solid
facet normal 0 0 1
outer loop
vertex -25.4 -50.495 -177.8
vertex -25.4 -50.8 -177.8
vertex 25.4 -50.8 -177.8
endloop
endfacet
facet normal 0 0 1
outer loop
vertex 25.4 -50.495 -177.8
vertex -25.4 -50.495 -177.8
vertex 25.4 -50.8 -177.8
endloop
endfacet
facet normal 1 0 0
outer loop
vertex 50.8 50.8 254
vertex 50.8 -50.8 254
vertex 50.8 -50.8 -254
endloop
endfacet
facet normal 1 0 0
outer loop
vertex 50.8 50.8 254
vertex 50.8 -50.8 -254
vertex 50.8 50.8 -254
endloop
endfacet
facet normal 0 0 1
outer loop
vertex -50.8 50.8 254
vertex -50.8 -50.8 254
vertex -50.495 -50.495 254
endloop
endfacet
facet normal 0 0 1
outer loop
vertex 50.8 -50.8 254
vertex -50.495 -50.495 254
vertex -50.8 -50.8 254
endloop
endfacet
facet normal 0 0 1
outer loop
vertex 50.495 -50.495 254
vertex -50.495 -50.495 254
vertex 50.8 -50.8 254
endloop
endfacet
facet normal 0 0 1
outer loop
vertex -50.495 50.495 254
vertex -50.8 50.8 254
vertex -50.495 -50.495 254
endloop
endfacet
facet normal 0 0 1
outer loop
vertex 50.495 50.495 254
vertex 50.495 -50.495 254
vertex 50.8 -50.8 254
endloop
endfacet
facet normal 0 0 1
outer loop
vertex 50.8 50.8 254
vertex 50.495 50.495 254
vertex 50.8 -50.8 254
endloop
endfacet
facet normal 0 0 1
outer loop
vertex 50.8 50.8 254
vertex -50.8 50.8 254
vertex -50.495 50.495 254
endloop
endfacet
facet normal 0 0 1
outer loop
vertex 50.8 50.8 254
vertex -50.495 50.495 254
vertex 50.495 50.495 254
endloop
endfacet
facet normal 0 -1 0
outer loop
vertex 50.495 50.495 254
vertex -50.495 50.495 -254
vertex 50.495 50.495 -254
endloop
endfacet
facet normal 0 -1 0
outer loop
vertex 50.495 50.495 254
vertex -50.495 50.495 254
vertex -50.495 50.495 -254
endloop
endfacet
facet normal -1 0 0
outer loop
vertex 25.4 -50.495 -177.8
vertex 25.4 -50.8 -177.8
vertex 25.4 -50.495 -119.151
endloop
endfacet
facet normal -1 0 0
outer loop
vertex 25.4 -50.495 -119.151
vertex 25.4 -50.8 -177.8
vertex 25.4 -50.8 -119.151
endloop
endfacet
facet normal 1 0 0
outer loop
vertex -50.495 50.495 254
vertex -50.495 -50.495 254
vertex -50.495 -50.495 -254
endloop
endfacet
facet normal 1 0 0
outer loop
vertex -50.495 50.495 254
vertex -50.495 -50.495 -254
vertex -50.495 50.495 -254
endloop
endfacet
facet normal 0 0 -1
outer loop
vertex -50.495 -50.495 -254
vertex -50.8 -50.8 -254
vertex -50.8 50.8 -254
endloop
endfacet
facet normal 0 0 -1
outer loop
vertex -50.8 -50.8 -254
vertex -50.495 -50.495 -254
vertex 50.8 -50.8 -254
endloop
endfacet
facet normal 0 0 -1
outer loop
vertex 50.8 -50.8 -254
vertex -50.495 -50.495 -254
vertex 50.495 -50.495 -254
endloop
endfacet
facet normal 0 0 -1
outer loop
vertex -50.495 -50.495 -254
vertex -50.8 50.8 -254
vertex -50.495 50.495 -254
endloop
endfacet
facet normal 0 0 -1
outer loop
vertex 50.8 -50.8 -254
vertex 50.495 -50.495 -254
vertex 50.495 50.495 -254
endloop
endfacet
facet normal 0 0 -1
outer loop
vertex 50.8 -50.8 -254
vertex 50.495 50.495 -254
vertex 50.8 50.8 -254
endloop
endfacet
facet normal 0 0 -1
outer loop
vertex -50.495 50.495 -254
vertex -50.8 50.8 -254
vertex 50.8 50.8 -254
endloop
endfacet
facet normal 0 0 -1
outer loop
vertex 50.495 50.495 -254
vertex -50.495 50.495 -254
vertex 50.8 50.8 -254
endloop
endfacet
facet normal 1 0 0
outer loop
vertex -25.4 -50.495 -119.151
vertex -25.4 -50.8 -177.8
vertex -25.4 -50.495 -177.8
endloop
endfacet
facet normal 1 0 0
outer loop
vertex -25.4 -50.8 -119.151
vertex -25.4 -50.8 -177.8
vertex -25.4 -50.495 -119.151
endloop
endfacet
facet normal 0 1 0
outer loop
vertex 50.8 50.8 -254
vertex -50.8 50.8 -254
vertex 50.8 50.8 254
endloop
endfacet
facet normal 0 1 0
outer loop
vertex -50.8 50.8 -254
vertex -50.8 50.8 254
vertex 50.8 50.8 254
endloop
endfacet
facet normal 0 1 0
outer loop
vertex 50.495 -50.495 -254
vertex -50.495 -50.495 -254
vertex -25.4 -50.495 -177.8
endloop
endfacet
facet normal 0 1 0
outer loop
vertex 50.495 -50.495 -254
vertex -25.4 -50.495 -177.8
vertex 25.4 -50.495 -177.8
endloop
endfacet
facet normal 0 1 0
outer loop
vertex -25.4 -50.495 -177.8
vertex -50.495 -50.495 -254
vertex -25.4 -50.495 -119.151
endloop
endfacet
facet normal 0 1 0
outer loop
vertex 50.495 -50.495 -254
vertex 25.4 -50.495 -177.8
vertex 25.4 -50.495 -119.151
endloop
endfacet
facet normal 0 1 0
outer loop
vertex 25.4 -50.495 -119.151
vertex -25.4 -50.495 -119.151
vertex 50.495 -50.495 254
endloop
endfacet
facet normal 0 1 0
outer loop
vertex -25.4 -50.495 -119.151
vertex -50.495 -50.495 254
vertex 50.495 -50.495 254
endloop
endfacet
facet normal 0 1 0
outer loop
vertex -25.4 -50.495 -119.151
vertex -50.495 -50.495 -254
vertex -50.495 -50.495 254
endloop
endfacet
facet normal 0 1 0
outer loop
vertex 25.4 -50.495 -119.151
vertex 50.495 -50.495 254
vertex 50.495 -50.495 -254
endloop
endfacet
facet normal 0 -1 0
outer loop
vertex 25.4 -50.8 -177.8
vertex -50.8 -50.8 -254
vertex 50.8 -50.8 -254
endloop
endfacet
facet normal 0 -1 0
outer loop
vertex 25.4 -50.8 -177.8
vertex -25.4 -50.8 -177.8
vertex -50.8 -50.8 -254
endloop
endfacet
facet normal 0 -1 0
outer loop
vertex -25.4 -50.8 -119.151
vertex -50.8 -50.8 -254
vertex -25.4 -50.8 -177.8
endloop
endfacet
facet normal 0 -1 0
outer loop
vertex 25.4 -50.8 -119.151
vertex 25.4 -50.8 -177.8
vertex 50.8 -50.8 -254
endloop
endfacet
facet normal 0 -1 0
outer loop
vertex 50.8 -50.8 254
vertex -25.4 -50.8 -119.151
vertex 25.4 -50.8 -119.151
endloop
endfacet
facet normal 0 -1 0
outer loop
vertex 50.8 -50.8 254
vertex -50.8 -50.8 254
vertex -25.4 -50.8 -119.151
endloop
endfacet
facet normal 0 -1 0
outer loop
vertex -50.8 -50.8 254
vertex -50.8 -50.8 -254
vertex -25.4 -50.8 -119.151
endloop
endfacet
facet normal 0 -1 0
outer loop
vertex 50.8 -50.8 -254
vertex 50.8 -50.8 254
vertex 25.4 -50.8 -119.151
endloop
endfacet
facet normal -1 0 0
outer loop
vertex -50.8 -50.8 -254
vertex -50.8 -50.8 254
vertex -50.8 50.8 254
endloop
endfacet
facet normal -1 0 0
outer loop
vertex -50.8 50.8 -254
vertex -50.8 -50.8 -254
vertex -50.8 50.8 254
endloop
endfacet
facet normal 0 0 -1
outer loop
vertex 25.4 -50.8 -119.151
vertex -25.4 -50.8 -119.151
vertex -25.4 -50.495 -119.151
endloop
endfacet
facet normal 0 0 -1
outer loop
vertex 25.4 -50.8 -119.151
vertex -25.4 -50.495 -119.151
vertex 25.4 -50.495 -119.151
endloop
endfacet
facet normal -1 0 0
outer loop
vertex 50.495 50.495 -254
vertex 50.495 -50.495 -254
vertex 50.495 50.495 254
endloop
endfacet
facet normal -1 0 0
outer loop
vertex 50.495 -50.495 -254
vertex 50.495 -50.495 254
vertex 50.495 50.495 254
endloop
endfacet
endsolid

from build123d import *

# Parameters (mm, degrees)
F0_W     = 101.6
F0_H     = 101.6
F0_W_2   = 100.9904
F0_H_2   = 100.9904
F1_DEPTH = 254
F2_DEPTH = 254
F3_W     = 50.8
F3_H     = 58.6486
F4_DEPTH = 0.32766


with BuildPart() as f1:
    # F0 (on Top) → F1 (new body, symmetric)
    with BuildSketch(Plane.XY):
        Rectangle(F0_W, F0_H)
        Rectangle(F0_W_2, F0_H_2, mode=Mode.SUBTRACT)
    extrude(amount=F1_DEPTH, both=True)

    # F0 (on Top) → F2 (cut, symmetric)
    with BuildSketch(Plane.XY):
        Rectangle(F0_W_2, F0_H_2)
    extrude(amount=F2_DEPTH, both=True, mode=Mode.SUBTRACT)

    # F3 (on face) → F4 (cut)
    with BuildSketch(Plane.XZ.offset(50.8)):
        with Locations((0, -148.4757)):
            Rectangle(F3_W, F3_H)
    extrude(amount=-F4_DEPTH, mode=Mode.SUBTRACT)


solid = f1.part
